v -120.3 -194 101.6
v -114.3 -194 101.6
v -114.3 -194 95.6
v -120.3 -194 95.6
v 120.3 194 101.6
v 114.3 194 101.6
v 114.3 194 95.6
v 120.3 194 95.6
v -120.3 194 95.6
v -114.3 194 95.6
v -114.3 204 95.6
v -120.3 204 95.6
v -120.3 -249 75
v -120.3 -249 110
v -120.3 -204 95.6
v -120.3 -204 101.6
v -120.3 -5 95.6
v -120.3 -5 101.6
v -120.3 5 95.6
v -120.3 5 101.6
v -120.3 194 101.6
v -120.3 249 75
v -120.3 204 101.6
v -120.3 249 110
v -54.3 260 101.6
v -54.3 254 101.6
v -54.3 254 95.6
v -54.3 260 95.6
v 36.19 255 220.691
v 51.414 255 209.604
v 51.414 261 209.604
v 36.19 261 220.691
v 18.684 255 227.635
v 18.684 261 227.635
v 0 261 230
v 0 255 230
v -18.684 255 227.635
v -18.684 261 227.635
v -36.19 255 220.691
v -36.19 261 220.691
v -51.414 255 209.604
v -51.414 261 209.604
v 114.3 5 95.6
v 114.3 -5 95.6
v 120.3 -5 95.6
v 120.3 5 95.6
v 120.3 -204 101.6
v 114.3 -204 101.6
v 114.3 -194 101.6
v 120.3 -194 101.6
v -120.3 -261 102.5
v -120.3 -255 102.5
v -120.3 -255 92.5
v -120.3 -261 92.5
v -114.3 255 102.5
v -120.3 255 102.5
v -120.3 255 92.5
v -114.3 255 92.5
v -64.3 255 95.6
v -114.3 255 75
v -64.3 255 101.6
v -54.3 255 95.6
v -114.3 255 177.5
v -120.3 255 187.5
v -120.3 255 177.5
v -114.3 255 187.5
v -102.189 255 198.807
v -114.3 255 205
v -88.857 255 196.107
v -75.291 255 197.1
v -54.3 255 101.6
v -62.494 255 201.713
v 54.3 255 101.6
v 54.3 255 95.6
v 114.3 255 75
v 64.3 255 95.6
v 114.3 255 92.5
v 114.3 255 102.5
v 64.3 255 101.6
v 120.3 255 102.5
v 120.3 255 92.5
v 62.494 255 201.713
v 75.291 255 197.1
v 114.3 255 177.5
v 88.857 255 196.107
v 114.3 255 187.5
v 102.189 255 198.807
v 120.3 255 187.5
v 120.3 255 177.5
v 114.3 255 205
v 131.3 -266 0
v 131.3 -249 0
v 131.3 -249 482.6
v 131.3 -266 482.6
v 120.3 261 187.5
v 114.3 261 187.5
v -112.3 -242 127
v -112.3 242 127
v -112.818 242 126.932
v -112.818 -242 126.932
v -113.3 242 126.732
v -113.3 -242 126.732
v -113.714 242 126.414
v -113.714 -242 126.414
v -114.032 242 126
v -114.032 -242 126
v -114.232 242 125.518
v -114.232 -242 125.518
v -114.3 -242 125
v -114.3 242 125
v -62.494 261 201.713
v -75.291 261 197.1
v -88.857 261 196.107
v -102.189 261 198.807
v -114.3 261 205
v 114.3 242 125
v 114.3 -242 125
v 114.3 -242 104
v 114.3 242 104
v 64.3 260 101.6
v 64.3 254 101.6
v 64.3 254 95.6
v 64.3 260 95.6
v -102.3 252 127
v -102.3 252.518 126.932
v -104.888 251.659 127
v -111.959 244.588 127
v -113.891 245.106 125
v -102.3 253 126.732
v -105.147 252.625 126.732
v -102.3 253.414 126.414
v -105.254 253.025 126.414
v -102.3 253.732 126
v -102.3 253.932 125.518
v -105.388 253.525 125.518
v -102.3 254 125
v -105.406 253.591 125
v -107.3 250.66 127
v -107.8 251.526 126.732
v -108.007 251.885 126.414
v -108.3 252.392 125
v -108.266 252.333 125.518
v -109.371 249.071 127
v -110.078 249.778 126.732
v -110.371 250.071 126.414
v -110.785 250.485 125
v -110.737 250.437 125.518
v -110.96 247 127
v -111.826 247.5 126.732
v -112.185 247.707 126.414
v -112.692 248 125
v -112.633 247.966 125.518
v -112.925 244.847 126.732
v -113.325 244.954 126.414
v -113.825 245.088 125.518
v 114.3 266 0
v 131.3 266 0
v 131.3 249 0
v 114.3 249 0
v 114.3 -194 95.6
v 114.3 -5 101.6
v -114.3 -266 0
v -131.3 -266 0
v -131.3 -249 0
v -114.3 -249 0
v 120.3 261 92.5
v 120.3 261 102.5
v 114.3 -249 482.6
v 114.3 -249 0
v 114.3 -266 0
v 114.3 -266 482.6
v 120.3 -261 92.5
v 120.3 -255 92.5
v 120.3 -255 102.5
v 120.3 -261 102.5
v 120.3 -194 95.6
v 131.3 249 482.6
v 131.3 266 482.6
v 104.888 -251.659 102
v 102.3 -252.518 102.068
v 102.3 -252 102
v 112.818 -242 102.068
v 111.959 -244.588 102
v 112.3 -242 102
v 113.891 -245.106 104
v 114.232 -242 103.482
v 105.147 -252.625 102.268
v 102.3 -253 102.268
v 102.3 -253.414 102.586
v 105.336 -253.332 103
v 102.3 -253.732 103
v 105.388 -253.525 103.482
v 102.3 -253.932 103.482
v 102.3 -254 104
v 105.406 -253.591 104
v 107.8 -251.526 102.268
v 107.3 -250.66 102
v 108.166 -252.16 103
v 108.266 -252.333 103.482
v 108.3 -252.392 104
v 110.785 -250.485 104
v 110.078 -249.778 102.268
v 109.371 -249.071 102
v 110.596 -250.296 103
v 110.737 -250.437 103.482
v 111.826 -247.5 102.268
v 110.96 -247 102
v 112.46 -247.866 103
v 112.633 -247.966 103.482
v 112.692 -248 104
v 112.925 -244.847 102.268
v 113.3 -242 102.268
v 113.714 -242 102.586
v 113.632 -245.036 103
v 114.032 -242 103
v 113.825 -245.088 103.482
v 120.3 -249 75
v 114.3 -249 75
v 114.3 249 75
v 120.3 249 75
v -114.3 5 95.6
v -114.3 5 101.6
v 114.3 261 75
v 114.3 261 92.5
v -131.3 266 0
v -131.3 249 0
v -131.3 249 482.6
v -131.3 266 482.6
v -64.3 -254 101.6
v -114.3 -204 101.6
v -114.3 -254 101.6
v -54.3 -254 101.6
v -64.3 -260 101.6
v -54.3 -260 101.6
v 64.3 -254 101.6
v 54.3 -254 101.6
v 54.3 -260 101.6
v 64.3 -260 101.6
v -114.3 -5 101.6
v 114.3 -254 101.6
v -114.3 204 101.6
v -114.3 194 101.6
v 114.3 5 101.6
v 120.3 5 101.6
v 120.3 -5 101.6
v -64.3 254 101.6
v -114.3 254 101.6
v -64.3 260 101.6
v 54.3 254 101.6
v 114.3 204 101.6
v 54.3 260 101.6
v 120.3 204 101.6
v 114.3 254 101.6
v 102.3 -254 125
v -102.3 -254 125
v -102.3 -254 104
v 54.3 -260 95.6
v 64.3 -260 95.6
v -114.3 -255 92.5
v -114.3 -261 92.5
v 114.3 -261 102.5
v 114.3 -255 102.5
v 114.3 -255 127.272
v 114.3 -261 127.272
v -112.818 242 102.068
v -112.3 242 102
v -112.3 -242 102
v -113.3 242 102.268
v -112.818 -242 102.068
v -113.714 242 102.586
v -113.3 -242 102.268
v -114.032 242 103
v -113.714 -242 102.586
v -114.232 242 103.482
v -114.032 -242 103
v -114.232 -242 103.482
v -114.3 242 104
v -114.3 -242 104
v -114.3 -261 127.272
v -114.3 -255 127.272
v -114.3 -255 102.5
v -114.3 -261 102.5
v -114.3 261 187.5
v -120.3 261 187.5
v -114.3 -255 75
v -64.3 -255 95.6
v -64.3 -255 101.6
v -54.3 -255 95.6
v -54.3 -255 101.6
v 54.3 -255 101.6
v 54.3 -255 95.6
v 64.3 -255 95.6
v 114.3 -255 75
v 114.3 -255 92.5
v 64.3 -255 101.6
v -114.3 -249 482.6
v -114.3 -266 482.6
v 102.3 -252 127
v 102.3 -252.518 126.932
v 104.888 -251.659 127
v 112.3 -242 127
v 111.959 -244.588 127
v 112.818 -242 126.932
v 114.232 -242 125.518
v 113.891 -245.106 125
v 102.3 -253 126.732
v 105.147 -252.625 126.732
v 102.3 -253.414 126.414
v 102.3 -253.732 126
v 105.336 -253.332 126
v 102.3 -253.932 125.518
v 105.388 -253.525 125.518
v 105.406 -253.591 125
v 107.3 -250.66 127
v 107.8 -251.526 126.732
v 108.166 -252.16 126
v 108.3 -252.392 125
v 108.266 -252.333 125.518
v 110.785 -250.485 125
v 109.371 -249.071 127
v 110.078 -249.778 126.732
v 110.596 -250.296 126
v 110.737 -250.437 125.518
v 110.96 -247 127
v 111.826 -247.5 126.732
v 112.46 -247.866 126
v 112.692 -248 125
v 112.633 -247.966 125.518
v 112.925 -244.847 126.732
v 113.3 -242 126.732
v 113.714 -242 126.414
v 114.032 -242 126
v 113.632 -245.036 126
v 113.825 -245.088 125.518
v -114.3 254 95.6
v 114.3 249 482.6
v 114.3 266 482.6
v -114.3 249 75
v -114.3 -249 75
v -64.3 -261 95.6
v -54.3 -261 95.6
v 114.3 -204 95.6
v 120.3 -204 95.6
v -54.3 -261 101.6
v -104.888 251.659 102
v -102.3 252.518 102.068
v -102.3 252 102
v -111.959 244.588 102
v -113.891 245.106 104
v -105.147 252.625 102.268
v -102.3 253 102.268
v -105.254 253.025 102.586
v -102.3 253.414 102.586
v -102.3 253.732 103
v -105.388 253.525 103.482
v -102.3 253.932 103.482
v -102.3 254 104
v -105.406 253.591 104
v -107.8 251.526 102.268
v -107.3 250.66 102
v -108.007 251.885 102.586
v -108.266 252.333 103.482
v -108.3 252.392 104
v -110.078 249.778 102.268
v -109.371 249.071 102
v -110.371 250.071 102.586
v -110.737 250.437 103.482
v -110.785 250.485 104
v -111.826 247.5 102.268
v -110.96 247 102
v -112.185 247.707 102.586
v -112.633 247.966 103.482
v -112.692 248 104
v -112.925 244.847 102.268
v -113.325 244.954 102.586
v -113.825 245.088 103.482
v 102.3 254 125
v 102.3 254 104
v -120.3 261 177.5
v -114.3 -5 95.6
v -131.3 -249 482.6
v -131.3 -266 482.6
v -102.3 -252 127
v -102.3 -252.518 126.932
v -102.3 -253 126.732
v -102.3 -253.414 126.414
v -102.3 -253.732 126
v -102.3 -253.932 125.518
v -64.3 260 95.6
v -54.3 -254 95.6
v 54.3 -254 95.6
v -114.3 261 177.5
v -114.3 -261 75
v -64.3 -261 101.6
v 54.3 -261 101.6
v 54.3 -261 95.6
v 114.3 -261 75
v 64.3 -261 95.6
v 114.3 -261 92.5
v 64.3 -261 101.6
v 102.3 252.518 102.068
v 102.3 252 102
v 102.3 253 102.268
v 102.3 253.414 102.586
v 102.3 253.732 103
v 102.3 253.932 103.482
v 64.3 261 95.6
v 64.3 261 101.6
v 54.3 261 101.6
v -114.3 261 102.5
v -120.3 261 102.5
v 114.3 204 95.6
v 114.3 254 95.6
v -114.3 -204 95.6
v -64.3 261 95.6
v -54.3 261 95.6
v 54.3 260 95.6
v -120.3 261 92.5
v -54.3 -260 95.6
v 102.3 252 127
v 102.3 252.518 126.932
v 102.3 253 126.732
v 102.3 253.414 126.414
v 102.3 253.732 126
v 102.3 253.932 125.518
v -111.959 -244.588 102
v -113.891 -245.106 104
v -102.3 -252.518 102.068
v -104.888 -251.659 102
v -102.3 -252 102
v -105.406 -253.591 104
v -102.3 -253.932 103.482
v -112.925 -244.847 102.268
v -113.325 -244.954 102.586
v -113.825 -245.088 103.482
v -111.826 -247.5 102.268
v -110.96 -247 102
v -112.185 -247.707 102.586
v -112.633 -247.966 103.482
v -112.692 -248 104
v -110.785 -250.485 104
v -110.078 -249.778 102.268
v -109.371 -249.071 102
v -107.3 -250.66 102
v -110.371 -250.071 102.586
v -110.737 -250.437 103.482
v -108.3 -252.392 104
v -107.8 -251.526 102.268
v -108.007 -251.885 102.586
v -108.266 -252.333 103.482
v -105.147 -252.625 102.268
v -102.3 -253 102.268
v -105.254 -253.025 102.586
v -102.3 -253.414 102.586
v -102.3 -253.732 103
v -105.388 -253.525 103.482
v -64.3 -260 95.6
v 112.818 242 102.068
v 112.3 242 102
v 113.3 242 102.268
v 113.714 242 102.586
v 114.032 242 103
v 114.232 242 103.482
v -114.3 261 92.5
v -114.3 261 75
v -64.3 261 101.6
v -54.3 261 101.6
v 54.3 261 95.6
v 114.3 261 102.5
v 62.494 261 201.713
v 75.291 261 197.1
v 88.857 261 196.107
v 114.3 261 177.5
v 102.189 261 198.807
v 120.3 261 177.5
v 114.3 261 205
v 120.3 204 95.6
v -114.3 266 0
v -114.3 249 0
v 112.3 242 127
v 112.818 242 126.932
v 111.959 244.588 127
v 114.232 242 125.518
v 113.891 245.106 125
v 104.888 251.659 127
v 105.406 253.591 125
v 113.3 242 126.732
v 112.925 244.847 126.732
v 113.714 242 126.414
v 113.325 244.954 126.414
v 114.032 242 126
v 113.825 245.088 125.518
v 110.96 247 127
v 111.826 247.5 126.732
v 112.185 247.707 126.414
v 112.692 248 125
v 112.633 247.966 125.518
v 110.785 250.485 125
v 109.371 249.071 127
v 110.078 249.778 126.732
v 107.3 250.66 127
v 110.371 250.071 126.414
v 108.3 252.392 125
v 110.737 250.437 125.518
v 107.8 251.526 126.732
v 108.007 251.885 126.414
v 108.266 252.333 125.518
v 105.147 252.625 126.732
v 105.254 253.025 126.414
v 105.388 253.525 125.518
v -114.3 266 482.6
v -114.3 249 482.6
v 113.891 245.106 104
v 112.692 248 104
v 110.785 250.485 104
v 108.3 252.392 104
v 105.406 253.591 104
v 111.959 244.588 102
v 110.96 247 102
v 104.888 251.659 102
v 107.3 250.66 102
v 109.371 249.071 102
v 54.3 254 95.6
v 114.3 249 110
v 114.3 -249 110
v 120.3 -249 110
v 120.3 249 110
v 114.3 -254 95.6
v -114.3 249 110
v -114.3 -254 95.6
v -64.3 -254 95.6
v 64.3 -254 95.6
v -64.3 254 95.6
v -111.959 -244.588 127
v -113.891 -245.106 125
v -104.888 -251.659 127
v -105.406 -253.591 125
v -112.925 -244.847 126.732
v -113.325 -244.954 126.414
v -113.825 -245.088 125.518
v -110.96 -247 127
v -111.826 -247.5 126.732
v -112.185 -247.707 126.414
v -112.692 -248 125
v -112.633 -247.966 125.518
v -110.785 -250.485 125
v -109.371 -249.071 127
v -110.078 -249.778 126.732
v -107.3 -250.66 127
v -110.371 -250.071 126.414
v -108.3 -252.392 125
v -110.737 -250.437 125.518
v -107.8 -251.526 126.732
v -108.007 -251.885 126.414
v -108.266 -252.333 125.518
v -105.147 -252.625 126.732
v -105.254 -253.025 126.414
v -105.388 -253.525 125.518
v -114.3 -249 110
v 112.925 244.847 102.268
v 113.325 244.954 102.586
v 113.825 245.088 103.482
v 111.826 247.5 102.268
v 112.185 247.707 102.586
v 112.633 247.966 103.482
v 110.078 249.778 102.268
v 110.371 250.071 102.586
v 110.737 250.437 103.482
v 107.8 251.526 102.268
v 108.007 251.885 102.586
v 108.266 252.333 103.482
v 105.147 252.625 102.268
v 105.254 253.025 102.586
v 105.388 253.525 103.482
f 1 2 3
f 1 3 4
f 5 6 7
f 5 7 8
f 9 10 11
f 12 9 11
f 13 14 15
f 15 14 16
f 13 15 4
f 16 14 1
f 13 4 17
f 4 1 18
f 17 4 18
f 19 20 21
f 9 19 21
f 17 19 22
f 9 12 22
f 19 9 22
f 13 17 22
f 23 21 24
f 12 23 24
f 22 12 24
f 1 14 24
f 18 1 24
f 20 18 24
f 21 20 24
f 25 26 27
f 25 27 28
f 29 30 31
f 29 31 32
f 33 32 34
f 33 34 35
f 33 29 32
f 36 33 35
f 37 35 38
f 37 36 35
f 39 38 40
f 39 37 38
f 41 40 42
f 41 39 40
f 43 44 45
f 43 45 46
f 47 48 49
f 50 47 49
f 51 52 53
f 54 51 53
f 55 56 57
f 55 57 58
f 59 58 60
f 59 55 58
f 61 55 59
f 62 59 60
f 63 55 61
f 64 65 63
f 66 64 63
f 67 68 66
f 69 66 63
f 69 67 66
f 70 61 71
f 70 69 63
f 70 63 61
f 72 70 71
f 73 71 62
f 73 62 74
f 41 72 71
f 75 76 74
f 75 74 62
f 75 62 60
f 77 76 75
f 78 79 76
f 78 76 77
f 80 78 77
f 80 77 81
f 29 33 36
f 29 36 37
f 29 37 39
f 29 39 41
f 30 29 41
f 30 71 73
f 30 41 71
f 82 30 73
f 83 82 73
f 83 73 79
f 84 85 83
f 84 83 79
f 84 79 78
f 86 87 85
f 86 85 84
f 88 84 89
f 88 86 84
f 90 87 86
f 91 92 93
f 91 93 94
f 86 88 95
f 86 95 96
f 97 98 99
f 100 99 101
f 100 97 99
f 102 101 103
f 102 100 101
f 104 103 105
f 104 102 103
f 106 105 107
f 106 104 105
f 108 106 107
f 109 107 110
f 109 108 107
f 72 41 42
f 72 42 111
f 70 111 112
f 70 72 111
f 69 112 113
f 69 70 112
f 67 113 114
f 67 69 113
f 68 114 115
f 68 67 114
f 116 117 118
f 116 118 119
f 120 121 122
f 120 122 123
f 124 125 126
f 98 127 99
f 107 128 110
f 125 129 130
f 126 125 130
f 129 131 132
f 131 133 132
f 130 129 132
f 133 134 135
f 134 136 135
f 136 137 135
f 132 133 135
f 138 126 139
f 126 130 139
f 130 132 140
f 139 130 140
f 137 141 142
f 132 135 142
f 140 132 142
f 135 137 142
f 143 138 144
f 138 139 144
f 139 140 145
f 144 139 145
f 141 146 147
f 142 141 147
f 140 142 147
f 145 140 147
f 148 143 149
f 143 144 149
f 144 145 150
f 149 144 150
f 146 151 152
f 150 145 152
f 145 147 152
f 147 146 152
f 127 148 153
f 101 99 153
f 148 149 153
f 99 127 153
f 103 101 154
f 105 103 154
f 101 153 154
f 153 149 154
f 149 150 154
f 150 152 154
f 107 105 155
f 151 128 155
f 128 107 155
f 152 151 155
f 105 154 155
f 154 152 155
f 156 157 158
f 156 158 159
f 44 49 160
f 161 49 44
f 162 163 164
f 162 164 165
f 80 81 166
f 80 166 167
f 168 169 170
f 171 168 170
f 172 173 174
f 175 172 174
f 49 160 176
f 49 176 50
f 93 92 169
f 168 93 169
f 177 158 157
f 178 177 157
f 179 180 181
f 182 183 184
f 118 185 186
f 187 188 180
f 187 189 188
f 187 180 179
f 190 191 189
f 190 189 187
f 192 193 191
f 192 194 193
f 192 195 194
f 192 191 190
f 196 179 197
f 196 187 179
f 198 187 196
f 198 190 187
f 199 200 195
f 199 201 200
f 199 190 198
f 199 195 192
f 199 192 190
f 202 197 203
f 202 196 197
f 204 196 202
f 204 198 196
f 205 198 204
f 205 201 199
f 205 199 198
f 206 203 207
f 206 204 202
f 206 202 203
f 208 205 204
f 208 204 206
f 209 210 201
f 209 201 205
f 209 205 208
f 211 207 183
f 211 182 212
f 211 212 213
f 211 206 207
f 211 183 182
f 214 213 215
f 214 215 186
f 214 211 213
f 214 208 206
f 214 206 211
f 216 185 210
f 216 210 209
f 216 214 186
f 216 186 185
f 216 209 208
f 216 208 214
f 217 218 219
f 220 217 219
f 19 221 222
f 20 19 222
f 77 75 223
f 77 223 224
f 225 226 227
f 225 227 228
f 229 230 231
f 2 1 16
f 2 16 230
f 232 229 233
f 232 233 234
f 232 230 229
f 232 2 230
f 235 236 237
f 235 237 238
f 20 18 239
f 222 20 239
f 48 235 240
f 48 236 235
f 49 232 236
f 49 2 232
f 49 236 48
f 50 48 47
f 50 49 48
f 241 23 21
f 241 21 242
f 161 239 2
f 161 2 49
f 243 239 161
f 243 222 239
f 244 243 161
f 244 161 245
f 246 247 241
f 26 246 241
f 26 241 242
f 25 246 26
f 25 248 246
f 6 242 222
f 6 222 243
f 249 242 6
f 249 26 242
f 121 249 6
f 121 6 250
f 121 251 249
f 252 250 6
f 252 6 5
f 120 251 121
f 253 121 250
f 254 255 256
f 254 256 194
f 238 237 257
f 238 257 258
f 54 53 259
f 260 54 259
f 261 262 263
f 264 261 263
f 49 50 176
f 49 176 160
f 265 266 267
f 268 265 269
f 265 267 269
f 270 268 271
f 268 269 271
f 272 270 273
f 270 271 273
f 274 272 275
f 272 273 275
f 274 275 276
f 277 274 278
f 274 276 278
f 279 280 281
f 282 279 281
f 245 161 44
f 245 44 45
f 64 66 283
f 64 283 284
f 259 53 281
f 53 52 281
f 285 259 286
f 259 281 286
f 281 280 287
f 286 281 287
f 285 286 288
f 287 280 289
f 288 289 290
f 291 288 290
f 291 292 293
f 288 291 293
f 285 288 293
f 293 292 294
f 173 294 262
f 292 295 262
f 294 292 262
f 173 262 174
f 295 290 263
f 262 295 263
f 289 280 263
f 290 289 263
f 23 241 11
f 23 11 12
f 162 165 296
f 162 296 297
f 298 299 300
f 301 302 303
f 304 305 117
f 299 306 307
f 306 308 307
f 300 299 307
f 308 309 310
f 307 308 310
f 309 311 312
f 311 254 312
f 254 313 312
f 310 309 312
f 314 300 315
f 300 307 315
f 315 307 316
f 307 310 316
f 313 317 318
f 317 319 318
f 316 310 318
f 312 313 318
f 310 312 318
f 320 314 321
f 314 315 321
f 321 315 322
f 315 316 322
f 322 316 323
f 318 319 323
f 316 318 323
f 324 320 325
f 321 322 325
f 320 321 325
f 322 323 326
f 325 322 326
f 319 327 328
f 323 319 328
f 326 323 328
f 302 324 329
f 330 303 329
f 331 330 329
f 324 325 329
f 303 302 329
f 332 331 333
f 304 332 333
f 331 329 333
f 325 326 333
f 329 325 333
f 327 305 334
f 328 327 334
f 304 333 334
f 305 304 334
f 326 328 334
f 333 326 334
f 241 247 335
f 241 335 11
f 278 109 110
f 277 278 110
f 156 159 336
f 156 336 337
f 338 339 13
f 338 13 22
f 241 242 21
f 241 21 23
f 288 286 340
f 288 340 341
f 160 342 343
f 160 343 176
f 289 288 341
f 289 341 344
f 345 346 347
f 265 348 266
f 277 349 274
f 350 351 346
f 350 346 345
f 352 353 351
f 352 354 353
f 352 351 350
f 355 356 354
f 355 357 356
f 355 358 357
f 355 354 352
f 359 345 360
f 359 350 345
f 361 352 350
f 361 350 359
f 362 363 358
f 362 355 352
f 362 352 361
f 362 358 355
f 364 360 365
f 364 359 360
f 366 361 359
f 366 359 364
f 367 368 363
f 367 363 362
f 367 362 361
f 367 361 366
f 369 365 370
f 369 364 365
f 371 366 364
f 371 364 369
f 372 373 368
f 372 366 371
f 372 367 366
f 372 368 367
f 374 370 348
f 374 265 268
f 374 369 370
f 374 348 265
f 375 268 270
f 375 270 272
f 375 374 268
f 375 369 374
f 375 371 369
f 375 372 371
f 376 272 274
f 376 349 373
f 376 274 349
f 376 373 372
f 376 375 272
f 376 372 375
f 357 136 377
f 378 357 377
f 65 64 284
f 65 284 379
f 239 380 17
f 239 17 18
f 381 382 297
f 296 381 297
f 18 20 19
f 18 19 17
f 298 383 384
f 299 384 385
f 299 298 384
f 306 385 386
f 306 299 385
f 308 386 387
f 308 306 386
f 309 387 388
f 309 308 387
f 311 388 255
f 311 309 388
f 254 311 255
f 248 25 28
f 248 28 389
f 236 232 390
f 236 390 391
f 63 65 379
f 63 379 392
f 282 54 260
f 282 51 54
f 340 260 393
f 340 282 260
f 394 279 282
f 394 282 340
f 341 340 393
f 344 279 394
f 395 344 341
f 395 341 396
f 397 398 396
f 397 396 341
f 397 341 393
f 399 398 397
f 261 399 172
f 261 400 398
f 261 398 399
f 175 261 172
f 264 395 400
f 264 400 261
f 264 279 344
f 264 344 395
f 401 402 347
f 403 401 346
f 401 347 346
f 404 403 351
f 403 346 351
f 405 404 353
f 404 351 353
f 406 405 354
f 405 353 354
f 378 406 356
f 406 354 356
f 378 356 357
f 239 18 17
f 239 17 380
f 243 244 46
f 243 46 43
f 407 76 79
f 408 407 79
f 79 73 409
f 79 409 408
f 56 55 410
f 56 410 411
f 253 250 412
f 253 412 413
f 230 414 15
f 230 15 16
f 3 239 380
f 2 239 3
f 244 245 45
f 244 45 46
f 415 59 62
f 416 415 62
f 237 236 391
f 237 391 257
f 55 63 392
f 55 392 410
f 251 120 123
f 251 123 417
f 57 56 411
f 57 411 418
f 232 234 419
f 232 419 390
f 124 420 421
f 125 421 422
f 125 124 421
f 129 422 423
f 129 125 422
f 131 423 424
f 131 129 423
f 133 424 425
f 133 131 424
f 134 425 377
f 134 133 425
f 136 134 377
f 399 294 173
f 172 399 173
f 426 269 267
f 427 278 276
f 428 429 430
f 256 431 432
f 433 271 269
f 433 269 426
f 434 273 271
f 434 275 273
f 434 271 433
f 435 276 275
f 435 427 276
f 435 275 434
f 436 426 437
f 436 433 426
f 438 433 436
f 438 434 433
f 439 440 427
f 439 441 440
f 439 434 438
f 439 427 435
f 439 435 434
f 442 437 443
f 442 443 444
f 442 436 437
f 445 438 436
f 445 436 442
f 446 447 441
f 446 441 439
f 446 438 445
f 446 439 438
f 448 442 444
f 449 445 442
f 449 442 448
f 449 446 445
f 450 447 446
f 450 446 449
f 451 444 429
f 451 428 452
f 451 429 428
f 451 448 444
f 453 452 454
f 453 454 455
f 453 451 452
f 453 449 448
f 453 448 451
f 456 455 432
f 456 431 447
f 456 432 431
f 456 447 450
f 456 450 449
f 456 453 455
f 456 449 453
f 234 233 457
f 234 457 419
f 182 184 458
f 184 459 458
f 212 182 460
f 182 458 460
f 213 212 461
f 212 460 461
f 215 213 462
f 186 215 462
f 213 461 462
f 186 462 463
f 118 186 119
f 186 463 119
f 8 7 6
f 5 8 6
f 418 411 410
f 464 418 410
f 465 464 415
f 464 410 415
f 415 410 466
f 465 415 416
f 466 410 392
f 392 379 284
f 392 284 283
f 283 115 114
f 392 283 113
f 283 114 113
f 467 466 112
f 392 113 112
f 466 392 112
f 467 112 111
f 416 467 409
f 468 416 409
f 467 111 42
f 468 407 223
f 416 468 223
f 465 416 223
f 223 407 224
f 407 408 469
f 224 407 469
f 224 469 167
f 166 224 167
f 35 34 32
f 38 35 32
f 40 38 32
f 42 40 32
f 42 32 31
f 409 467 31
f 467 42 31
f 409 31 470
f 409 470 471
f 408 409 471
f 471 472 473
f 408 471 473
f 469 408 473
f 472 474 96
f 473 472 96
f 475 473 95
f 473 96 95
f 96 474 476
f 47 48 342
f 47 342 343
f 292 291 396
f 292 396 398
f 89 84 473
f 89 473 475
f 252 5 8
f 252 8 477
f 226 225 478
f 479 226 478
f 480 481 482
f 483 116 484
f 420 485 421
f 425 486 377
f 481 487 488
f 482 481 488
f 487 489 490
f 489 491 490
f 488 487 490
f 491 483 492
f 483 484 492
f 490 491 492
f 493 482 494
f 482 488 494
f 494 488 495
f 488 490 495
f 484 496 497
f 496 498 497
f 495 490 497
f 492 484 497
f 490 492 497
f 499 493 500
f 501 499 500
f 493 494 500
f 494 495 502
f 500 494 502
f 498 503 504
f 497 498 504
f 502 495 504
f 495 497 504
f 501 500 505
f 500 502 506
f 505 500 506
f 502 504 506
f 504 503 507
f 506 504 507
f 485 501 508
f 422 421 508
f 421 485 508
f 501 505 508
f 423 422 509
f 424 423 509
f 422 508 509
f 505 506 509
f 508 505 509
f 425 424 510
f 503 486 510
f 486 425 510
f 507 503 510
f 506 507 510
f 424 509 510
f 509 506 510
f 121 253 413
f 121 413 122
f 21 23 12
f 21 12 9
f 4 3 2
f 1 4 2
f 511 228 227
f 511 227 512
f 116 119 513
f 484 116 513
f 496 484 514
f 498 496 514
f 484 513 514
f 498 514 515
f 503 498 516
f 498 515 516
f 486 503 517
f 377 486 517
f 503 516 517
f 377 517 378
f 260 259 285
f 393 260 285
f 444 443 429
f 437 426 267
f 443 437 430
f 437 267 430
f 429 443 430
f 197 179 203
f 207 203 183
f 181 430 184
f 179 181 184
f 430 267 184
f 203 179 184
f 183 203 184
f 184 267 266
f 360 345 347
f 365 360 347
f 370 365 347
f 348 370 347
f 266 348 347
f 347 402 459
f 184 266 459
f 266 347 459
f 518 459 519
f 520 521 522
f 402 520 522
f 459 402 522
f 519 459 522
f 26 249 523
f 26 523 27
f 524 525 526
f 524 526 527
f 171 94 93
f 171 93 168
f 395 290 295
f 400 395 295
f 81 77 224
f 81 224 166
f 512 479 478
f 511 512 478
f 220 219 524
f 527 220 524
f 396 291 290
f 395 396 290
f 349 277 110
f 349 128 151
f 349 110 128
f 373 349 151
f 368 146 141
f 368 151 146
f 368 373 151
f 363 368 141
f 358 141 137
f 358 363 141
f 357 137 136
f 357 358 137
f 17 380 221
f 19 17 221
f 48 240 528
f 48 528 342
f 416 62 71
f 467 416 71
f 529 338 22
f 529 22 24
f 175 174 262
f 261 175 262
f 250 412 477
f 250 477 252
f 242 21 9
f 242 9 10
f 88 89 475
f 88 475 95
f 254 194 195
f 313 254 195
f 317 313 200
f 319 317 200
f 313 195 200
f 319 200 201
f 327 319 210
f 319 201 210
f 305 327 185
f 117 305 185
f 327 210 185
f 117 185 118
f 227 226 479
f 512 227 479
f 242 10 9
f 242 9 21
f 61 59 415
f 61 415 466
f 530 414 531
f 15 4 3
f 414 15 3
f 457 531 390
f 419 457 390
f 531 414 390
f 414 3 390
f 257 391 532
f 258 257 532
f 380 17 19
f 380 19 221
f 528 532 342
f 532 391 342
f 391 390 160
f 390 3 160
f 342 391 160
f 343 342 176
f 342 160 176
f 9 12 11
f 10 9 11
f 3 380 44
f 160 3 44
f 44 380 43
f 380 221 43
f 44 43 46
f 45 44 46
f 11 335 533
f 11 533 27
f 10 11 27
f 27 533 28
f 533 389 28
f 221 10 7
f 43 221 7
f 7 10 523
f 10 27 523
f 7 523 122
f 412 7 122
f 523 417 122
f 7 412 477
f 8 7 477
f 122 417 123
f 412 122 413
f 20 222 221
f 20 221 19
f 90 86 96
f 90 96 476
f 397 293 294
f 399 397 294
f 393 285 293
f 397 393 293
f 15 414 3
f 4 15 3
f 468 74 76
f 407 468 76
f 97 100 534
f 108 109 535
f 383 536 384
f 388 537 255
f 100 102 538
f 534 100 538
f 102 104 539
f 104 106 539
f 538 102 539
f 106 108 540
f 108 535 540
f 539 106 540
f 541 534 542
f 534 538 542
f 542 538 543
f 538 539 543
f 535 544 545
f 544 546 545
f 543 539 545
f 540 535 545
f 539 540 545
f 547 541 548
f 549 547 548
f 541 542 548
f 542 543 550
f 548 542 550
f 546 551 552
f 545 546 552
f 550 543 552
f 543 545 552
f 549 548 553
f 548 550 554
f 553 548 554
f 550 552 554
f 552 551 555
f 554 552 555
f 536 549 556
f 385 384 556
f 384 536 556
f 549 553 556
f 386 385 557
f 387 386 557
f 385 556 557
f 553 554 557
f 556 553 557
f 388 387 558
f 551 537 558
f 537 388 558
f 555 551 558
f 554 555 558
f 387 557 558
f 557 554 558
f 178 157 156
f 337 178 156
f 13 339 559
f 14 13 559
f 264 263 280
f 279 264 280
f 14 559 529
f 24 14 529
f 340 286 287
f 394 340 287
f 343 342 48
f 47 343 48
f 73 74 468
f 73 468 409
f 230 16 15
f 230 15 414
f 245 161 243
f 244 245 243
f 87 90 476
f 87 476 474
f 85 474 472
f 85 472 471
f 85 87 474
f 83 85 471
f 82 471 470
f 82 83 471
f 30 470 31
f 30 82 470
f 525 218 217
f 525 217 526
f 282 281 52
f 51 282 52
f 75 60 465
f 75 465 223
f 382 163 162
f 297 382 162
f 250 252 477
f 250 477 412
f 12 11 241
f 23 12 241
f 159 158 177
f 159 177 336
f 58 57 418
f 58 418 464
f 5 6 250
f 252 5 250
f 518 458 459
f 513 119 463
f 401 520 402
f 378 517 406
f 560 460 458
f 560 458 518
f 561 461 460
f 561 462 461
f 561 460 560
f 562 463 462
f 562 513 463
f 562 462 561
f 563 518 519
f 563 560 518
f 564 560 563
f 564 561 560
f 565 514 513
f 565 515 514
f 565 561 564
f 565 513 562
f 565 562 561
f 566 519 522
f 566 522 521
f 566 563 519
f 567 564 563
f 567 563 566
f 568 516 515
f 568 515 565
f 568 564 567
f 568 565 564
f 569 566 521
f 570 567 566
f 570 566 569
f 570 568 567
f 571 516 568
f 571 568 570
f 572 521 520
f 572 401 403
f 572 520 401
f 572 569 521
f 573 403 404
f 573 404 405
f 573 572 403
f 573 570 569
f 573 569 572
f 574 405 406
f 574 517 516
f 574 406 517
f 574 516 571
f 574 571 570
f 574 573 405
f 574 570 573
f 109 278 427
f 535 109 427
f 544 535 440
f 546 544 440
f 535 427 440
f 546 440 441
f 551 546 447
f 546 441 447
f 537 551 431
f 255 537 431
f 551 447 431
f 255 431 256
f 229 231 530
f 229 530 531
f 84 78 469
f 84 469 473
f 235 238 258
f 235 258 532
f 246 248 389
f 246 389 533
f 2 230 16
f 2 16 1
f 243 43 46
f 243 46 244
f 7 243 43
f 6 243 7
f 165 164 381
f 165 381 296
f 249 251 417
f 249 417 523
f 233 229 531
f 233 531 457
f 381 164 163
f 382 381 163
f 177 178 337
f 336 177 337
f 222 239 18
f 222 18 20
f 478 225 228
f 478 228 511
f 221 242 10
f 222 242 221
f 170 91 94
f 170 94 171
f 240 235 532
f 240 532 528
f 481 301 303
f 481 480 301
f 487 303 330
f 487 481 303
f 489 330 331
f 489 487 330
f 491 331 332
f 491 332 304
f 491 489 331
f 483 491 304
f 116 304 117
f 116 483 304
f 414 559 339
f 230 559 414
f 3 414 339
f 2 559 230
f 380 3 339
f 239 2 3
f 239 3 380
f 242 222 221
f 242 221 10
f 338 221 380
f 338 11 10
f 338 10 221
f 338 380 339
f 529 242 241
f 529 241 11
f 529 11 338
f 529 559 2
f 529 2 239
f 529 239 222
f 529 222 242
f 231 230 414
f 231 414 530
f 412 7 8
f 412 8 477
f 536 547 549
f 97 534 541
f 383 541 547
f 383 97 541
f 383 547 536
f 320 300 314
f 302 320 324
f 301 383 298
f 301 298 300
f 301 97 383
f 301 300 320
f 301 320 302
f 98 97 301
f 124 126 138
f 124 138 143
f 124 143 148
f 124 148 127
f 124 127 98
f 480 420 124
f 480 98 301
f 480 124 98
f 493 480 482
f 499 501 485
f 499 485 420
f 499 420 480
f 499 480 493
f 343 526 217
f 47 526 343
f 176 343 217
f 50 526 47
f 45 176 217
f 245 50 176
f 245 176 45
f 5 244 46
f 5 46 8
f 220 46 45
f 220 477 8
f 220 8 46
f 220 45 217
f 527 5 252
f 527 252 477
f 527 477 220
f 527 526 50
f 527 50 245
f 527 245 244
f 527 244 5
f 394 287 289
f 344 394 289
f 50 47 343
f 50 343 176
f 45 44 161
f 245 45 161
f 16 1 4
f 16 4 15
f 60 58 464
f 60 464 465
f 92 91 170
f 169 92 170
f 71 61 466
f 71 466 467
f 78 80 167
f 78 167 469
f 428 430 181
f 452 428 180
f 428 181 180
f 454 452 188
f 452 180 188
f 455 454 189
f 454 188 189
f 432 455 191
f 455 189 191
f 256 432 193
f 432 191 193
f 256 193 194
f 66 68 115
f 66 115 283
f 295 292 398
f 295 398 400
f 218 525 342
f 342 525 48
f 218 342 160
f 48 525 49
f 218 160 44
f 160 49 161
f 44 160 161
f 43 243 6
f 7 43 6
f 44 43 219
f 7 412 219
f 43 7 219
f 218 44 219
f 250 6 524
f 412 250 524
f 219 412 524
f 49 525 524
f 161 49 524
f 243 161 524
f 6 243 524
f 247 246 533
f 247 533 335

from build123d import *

# Parameters (mm, degrees)
F4_DEPTH  = 6
F2_W      = 228.6
F2_H      = 508
F5_DEPTH  = 25
F6_R      = 12
F7_R      = 2
F9_W      = 10
F9_H      = 6
F10_DEPTH = 6
F12_W     = 10
F12_H     = 6
F13_DEPTH = 6
F15_W     = 498
F15_H     = 35
F15_W_2   = 10
F15_H_2   = 6
F16_DEPTH = 6
F18_W     = 17
F18_H     = 17
F19_DEPTH = 482.6


with BuildPart() as f4:
    # F3 (on offset) → F4 (new body)
    with BuildSketch(Plane.XY.offset(101.6)):
        Polygon((-64.3, 254), (-114.3, 254), (-114.3, 204), (-120.300002, 204), (-120.300002, 194), (-114.3, 194), (-114.3, 5), (-120.3, 5), (-120.3, -5), (-114.3, -5), (-114.3, -194), (-120.300002, -194), (-120.300002, -204), (-114.3, -204), (-114.3, -254), (-64.3, -254), (-64.3, -260.000002), (-54.3, -260.000002), (-54.3, -254), (54.3, -254), (54.3, -260.000002), (64.3, -260.000002), (64.3, -254), (114.3, -254), (114.3, -204), (120.300002, -204), (120.300002, -194), (114.3, -194), (114.3, -5), (120.3, -5), (120.3, 5), (114.3, 5), (114.3, 194), (120.300002, 194), (120.300002, 204), (114.3, 204), (114.3, 254), (64.3, 254), (64.3, 260.000002), (54.3, 260.000002), (54.3, 254), (-54.3, 254), (-54.3, 260.000002), (-64.3, 260.000002), align=None)
    extrude(amount=-F4_DEPTH)


with BuildPart() as f5:
    # F2 (on offset) → F5 (new body)
    with BuildSketch(Plane.XY.offset(127)):
        Rectangle(F2_W, F2_H)
    extrude(amount=-F5_DEPTH)

    # F6
    f6_edges = [f5.edges().sort_by_distance(p)[0] for p in [
        (-114.3, 254, 114.5),
        (-114.3, -254, 114.5),
        (114.3, -254, 114.5),
        (114.3, 254, 114.5),
    ]]
    fillet(f6_edges, radius=F6_R)

    # F7
    f7_edges = [f5.edges().sort_by_distance(p)[0] for p in [
        (114.3, 0, 127),
        (114.3, 0, 102),
    ]]
    fillet(f7_edges, radius=F7_R)


with BuildPart() as f10:
    # F9 (on offset) → F10 (new body)
    with BuildSketch(Plane.XZ.offset(-255)):
        with BuildLine():
            Line((-114.3, 75), (114.3, 75))
            Line((114.3, 75), (114.3, 92.5))
            Line((114.3, 92.5), (120.3, 92.5))
            Line((120.3, 92.5), (120.3, 102.5))
            Line((120.3, 102.5), (114.3, 102.5))
            Line((114.3, 102.5), (114.3, 177.5))
            Line((114.3, 177.5), (120.3, 177.5))
            Line((120.3, 177.5), (120.3, 187.5))
            Line((120.3, 187.5), (114.3, 187.5))
            Line((114.3, 187.5), (114.3, 205))
            ThreePointArc((114.3, 205), (82.040028, 196.139586), (51.414373, 209.603684))
            ThreePointArc((51.414373, 209.603684), (0, 230), (-51.414373, 209.603684))
            ThreePointArc((-51.414373, 209.603684), (-82.040028, 196.139586), (-114.3, 205))
            Line((-114.3, 205), (-114.3, 187.5))
            Line((-114.3, 187.5), (-120.3, 187.5))
            Line((-120.3, 187.5), (-120.3, 177.5))
            Line((-120.3, 177.5), (-114.3, 177.5))
            Line((-114.3, 177.5), (-114.3, 102.5))
            Line((-114.3, 102.5), (-120.3, 102.5))
            Line((-120.3, 102.5), (-120.3, 92.5))
            Line((-120.3, 92.5), (-114.3, 92.5))
            Line((-114.3, 92.5), (-114.3, 75))
        make_face()
        with Locations((-59.3, 98.6)):
            Rectangle(F9_W, F9_H, mode=Mode.SUBTRACT)
        with Locations((59.3, 98.6)):
            Rectangle(F9_W, F9_H, mode=Mode.SUBTRACT)
    extrude(amount=-F10_DEPTH)


with BuildPart() as f13:
    # F12 (on offset) → F13 (new body)
    with BuildSketch(Plane.XZ.offset(255)):
        Polygon((-120.3, 92.5), (-114.3, 92.5), (-114.3, 75), (114.3, 75), (114.3, 92.5), (120.3, 92.5), (120.3, 102.5), (114.3, 102.5), (114.3, 127.271906), (-114.3, 127.271906), (-114.3, 102.5), (-120.3, 102.5), align=None)
        with Locations((-59.3, 98.6)):
            Rectangle(F12_W, F12_H, mode=Mode.SUBTRACT)
        with Locations((59.3, 98.6)):
            Rectangle(F12_W, F12_H, mode=Mode.SUBTRACT)
    extrude(amount=F13_DEPTH)


with BuildPart() as f16:
    # F15 (on offset) → F16 (new body)
    with BuildSketch(Plane.YZ.offset(-114.3)):
        with Locations((0, 92.5)):
            Rectangle(F15_W, F15_H)
        with Locations((-199, 98.6)):
            Rectangle(F15_W_2, F15_H_2, mode=Mode.SUBTRACT)
        with Locations((0, 98.6)):
            Rectangle(F15_W_2, F15_H_2, mode=Mode.SUBTRACT)
        with Locations((199, 98.6)):
            Rectangle(F15_W_2, F15_H_2, mode=Mode.SUBTRACT)
    extrude(amount=-F16_DEPTH)


with BuildPart() as f17_1:
    # F17: instance of F16
    add(f16.part.mirror(Plane.YZ))


with BuildPart() as f19:
    # F18 (on Top) → F19 (new body)
    with BuildSketch(Plane.XY):
        with Locations((-122.8, 257.5)):
            Rectangle(F18_W, F18_H)
    extrude(amount=F19_DEPTH)


with BuildPart() as f20_1:
    # F20: instance of F19
    add(f19.part.mirror(Plane.YZ))


with BuildPart() as f21_1:
    # F21: instance of F19
    add(f19.part.mirror(Plane.XZ))


with BuildPart() as f21_2:
    # F21: instance of F20_1
    add(f20_1.part.mirror(Plane.XZ))


solid = Compound([f4.part, f5.part, f10.part, f13.part, f16.part, f17_1.part, f19.part, f20_1.part, f21_1.part, f21_2.part])
